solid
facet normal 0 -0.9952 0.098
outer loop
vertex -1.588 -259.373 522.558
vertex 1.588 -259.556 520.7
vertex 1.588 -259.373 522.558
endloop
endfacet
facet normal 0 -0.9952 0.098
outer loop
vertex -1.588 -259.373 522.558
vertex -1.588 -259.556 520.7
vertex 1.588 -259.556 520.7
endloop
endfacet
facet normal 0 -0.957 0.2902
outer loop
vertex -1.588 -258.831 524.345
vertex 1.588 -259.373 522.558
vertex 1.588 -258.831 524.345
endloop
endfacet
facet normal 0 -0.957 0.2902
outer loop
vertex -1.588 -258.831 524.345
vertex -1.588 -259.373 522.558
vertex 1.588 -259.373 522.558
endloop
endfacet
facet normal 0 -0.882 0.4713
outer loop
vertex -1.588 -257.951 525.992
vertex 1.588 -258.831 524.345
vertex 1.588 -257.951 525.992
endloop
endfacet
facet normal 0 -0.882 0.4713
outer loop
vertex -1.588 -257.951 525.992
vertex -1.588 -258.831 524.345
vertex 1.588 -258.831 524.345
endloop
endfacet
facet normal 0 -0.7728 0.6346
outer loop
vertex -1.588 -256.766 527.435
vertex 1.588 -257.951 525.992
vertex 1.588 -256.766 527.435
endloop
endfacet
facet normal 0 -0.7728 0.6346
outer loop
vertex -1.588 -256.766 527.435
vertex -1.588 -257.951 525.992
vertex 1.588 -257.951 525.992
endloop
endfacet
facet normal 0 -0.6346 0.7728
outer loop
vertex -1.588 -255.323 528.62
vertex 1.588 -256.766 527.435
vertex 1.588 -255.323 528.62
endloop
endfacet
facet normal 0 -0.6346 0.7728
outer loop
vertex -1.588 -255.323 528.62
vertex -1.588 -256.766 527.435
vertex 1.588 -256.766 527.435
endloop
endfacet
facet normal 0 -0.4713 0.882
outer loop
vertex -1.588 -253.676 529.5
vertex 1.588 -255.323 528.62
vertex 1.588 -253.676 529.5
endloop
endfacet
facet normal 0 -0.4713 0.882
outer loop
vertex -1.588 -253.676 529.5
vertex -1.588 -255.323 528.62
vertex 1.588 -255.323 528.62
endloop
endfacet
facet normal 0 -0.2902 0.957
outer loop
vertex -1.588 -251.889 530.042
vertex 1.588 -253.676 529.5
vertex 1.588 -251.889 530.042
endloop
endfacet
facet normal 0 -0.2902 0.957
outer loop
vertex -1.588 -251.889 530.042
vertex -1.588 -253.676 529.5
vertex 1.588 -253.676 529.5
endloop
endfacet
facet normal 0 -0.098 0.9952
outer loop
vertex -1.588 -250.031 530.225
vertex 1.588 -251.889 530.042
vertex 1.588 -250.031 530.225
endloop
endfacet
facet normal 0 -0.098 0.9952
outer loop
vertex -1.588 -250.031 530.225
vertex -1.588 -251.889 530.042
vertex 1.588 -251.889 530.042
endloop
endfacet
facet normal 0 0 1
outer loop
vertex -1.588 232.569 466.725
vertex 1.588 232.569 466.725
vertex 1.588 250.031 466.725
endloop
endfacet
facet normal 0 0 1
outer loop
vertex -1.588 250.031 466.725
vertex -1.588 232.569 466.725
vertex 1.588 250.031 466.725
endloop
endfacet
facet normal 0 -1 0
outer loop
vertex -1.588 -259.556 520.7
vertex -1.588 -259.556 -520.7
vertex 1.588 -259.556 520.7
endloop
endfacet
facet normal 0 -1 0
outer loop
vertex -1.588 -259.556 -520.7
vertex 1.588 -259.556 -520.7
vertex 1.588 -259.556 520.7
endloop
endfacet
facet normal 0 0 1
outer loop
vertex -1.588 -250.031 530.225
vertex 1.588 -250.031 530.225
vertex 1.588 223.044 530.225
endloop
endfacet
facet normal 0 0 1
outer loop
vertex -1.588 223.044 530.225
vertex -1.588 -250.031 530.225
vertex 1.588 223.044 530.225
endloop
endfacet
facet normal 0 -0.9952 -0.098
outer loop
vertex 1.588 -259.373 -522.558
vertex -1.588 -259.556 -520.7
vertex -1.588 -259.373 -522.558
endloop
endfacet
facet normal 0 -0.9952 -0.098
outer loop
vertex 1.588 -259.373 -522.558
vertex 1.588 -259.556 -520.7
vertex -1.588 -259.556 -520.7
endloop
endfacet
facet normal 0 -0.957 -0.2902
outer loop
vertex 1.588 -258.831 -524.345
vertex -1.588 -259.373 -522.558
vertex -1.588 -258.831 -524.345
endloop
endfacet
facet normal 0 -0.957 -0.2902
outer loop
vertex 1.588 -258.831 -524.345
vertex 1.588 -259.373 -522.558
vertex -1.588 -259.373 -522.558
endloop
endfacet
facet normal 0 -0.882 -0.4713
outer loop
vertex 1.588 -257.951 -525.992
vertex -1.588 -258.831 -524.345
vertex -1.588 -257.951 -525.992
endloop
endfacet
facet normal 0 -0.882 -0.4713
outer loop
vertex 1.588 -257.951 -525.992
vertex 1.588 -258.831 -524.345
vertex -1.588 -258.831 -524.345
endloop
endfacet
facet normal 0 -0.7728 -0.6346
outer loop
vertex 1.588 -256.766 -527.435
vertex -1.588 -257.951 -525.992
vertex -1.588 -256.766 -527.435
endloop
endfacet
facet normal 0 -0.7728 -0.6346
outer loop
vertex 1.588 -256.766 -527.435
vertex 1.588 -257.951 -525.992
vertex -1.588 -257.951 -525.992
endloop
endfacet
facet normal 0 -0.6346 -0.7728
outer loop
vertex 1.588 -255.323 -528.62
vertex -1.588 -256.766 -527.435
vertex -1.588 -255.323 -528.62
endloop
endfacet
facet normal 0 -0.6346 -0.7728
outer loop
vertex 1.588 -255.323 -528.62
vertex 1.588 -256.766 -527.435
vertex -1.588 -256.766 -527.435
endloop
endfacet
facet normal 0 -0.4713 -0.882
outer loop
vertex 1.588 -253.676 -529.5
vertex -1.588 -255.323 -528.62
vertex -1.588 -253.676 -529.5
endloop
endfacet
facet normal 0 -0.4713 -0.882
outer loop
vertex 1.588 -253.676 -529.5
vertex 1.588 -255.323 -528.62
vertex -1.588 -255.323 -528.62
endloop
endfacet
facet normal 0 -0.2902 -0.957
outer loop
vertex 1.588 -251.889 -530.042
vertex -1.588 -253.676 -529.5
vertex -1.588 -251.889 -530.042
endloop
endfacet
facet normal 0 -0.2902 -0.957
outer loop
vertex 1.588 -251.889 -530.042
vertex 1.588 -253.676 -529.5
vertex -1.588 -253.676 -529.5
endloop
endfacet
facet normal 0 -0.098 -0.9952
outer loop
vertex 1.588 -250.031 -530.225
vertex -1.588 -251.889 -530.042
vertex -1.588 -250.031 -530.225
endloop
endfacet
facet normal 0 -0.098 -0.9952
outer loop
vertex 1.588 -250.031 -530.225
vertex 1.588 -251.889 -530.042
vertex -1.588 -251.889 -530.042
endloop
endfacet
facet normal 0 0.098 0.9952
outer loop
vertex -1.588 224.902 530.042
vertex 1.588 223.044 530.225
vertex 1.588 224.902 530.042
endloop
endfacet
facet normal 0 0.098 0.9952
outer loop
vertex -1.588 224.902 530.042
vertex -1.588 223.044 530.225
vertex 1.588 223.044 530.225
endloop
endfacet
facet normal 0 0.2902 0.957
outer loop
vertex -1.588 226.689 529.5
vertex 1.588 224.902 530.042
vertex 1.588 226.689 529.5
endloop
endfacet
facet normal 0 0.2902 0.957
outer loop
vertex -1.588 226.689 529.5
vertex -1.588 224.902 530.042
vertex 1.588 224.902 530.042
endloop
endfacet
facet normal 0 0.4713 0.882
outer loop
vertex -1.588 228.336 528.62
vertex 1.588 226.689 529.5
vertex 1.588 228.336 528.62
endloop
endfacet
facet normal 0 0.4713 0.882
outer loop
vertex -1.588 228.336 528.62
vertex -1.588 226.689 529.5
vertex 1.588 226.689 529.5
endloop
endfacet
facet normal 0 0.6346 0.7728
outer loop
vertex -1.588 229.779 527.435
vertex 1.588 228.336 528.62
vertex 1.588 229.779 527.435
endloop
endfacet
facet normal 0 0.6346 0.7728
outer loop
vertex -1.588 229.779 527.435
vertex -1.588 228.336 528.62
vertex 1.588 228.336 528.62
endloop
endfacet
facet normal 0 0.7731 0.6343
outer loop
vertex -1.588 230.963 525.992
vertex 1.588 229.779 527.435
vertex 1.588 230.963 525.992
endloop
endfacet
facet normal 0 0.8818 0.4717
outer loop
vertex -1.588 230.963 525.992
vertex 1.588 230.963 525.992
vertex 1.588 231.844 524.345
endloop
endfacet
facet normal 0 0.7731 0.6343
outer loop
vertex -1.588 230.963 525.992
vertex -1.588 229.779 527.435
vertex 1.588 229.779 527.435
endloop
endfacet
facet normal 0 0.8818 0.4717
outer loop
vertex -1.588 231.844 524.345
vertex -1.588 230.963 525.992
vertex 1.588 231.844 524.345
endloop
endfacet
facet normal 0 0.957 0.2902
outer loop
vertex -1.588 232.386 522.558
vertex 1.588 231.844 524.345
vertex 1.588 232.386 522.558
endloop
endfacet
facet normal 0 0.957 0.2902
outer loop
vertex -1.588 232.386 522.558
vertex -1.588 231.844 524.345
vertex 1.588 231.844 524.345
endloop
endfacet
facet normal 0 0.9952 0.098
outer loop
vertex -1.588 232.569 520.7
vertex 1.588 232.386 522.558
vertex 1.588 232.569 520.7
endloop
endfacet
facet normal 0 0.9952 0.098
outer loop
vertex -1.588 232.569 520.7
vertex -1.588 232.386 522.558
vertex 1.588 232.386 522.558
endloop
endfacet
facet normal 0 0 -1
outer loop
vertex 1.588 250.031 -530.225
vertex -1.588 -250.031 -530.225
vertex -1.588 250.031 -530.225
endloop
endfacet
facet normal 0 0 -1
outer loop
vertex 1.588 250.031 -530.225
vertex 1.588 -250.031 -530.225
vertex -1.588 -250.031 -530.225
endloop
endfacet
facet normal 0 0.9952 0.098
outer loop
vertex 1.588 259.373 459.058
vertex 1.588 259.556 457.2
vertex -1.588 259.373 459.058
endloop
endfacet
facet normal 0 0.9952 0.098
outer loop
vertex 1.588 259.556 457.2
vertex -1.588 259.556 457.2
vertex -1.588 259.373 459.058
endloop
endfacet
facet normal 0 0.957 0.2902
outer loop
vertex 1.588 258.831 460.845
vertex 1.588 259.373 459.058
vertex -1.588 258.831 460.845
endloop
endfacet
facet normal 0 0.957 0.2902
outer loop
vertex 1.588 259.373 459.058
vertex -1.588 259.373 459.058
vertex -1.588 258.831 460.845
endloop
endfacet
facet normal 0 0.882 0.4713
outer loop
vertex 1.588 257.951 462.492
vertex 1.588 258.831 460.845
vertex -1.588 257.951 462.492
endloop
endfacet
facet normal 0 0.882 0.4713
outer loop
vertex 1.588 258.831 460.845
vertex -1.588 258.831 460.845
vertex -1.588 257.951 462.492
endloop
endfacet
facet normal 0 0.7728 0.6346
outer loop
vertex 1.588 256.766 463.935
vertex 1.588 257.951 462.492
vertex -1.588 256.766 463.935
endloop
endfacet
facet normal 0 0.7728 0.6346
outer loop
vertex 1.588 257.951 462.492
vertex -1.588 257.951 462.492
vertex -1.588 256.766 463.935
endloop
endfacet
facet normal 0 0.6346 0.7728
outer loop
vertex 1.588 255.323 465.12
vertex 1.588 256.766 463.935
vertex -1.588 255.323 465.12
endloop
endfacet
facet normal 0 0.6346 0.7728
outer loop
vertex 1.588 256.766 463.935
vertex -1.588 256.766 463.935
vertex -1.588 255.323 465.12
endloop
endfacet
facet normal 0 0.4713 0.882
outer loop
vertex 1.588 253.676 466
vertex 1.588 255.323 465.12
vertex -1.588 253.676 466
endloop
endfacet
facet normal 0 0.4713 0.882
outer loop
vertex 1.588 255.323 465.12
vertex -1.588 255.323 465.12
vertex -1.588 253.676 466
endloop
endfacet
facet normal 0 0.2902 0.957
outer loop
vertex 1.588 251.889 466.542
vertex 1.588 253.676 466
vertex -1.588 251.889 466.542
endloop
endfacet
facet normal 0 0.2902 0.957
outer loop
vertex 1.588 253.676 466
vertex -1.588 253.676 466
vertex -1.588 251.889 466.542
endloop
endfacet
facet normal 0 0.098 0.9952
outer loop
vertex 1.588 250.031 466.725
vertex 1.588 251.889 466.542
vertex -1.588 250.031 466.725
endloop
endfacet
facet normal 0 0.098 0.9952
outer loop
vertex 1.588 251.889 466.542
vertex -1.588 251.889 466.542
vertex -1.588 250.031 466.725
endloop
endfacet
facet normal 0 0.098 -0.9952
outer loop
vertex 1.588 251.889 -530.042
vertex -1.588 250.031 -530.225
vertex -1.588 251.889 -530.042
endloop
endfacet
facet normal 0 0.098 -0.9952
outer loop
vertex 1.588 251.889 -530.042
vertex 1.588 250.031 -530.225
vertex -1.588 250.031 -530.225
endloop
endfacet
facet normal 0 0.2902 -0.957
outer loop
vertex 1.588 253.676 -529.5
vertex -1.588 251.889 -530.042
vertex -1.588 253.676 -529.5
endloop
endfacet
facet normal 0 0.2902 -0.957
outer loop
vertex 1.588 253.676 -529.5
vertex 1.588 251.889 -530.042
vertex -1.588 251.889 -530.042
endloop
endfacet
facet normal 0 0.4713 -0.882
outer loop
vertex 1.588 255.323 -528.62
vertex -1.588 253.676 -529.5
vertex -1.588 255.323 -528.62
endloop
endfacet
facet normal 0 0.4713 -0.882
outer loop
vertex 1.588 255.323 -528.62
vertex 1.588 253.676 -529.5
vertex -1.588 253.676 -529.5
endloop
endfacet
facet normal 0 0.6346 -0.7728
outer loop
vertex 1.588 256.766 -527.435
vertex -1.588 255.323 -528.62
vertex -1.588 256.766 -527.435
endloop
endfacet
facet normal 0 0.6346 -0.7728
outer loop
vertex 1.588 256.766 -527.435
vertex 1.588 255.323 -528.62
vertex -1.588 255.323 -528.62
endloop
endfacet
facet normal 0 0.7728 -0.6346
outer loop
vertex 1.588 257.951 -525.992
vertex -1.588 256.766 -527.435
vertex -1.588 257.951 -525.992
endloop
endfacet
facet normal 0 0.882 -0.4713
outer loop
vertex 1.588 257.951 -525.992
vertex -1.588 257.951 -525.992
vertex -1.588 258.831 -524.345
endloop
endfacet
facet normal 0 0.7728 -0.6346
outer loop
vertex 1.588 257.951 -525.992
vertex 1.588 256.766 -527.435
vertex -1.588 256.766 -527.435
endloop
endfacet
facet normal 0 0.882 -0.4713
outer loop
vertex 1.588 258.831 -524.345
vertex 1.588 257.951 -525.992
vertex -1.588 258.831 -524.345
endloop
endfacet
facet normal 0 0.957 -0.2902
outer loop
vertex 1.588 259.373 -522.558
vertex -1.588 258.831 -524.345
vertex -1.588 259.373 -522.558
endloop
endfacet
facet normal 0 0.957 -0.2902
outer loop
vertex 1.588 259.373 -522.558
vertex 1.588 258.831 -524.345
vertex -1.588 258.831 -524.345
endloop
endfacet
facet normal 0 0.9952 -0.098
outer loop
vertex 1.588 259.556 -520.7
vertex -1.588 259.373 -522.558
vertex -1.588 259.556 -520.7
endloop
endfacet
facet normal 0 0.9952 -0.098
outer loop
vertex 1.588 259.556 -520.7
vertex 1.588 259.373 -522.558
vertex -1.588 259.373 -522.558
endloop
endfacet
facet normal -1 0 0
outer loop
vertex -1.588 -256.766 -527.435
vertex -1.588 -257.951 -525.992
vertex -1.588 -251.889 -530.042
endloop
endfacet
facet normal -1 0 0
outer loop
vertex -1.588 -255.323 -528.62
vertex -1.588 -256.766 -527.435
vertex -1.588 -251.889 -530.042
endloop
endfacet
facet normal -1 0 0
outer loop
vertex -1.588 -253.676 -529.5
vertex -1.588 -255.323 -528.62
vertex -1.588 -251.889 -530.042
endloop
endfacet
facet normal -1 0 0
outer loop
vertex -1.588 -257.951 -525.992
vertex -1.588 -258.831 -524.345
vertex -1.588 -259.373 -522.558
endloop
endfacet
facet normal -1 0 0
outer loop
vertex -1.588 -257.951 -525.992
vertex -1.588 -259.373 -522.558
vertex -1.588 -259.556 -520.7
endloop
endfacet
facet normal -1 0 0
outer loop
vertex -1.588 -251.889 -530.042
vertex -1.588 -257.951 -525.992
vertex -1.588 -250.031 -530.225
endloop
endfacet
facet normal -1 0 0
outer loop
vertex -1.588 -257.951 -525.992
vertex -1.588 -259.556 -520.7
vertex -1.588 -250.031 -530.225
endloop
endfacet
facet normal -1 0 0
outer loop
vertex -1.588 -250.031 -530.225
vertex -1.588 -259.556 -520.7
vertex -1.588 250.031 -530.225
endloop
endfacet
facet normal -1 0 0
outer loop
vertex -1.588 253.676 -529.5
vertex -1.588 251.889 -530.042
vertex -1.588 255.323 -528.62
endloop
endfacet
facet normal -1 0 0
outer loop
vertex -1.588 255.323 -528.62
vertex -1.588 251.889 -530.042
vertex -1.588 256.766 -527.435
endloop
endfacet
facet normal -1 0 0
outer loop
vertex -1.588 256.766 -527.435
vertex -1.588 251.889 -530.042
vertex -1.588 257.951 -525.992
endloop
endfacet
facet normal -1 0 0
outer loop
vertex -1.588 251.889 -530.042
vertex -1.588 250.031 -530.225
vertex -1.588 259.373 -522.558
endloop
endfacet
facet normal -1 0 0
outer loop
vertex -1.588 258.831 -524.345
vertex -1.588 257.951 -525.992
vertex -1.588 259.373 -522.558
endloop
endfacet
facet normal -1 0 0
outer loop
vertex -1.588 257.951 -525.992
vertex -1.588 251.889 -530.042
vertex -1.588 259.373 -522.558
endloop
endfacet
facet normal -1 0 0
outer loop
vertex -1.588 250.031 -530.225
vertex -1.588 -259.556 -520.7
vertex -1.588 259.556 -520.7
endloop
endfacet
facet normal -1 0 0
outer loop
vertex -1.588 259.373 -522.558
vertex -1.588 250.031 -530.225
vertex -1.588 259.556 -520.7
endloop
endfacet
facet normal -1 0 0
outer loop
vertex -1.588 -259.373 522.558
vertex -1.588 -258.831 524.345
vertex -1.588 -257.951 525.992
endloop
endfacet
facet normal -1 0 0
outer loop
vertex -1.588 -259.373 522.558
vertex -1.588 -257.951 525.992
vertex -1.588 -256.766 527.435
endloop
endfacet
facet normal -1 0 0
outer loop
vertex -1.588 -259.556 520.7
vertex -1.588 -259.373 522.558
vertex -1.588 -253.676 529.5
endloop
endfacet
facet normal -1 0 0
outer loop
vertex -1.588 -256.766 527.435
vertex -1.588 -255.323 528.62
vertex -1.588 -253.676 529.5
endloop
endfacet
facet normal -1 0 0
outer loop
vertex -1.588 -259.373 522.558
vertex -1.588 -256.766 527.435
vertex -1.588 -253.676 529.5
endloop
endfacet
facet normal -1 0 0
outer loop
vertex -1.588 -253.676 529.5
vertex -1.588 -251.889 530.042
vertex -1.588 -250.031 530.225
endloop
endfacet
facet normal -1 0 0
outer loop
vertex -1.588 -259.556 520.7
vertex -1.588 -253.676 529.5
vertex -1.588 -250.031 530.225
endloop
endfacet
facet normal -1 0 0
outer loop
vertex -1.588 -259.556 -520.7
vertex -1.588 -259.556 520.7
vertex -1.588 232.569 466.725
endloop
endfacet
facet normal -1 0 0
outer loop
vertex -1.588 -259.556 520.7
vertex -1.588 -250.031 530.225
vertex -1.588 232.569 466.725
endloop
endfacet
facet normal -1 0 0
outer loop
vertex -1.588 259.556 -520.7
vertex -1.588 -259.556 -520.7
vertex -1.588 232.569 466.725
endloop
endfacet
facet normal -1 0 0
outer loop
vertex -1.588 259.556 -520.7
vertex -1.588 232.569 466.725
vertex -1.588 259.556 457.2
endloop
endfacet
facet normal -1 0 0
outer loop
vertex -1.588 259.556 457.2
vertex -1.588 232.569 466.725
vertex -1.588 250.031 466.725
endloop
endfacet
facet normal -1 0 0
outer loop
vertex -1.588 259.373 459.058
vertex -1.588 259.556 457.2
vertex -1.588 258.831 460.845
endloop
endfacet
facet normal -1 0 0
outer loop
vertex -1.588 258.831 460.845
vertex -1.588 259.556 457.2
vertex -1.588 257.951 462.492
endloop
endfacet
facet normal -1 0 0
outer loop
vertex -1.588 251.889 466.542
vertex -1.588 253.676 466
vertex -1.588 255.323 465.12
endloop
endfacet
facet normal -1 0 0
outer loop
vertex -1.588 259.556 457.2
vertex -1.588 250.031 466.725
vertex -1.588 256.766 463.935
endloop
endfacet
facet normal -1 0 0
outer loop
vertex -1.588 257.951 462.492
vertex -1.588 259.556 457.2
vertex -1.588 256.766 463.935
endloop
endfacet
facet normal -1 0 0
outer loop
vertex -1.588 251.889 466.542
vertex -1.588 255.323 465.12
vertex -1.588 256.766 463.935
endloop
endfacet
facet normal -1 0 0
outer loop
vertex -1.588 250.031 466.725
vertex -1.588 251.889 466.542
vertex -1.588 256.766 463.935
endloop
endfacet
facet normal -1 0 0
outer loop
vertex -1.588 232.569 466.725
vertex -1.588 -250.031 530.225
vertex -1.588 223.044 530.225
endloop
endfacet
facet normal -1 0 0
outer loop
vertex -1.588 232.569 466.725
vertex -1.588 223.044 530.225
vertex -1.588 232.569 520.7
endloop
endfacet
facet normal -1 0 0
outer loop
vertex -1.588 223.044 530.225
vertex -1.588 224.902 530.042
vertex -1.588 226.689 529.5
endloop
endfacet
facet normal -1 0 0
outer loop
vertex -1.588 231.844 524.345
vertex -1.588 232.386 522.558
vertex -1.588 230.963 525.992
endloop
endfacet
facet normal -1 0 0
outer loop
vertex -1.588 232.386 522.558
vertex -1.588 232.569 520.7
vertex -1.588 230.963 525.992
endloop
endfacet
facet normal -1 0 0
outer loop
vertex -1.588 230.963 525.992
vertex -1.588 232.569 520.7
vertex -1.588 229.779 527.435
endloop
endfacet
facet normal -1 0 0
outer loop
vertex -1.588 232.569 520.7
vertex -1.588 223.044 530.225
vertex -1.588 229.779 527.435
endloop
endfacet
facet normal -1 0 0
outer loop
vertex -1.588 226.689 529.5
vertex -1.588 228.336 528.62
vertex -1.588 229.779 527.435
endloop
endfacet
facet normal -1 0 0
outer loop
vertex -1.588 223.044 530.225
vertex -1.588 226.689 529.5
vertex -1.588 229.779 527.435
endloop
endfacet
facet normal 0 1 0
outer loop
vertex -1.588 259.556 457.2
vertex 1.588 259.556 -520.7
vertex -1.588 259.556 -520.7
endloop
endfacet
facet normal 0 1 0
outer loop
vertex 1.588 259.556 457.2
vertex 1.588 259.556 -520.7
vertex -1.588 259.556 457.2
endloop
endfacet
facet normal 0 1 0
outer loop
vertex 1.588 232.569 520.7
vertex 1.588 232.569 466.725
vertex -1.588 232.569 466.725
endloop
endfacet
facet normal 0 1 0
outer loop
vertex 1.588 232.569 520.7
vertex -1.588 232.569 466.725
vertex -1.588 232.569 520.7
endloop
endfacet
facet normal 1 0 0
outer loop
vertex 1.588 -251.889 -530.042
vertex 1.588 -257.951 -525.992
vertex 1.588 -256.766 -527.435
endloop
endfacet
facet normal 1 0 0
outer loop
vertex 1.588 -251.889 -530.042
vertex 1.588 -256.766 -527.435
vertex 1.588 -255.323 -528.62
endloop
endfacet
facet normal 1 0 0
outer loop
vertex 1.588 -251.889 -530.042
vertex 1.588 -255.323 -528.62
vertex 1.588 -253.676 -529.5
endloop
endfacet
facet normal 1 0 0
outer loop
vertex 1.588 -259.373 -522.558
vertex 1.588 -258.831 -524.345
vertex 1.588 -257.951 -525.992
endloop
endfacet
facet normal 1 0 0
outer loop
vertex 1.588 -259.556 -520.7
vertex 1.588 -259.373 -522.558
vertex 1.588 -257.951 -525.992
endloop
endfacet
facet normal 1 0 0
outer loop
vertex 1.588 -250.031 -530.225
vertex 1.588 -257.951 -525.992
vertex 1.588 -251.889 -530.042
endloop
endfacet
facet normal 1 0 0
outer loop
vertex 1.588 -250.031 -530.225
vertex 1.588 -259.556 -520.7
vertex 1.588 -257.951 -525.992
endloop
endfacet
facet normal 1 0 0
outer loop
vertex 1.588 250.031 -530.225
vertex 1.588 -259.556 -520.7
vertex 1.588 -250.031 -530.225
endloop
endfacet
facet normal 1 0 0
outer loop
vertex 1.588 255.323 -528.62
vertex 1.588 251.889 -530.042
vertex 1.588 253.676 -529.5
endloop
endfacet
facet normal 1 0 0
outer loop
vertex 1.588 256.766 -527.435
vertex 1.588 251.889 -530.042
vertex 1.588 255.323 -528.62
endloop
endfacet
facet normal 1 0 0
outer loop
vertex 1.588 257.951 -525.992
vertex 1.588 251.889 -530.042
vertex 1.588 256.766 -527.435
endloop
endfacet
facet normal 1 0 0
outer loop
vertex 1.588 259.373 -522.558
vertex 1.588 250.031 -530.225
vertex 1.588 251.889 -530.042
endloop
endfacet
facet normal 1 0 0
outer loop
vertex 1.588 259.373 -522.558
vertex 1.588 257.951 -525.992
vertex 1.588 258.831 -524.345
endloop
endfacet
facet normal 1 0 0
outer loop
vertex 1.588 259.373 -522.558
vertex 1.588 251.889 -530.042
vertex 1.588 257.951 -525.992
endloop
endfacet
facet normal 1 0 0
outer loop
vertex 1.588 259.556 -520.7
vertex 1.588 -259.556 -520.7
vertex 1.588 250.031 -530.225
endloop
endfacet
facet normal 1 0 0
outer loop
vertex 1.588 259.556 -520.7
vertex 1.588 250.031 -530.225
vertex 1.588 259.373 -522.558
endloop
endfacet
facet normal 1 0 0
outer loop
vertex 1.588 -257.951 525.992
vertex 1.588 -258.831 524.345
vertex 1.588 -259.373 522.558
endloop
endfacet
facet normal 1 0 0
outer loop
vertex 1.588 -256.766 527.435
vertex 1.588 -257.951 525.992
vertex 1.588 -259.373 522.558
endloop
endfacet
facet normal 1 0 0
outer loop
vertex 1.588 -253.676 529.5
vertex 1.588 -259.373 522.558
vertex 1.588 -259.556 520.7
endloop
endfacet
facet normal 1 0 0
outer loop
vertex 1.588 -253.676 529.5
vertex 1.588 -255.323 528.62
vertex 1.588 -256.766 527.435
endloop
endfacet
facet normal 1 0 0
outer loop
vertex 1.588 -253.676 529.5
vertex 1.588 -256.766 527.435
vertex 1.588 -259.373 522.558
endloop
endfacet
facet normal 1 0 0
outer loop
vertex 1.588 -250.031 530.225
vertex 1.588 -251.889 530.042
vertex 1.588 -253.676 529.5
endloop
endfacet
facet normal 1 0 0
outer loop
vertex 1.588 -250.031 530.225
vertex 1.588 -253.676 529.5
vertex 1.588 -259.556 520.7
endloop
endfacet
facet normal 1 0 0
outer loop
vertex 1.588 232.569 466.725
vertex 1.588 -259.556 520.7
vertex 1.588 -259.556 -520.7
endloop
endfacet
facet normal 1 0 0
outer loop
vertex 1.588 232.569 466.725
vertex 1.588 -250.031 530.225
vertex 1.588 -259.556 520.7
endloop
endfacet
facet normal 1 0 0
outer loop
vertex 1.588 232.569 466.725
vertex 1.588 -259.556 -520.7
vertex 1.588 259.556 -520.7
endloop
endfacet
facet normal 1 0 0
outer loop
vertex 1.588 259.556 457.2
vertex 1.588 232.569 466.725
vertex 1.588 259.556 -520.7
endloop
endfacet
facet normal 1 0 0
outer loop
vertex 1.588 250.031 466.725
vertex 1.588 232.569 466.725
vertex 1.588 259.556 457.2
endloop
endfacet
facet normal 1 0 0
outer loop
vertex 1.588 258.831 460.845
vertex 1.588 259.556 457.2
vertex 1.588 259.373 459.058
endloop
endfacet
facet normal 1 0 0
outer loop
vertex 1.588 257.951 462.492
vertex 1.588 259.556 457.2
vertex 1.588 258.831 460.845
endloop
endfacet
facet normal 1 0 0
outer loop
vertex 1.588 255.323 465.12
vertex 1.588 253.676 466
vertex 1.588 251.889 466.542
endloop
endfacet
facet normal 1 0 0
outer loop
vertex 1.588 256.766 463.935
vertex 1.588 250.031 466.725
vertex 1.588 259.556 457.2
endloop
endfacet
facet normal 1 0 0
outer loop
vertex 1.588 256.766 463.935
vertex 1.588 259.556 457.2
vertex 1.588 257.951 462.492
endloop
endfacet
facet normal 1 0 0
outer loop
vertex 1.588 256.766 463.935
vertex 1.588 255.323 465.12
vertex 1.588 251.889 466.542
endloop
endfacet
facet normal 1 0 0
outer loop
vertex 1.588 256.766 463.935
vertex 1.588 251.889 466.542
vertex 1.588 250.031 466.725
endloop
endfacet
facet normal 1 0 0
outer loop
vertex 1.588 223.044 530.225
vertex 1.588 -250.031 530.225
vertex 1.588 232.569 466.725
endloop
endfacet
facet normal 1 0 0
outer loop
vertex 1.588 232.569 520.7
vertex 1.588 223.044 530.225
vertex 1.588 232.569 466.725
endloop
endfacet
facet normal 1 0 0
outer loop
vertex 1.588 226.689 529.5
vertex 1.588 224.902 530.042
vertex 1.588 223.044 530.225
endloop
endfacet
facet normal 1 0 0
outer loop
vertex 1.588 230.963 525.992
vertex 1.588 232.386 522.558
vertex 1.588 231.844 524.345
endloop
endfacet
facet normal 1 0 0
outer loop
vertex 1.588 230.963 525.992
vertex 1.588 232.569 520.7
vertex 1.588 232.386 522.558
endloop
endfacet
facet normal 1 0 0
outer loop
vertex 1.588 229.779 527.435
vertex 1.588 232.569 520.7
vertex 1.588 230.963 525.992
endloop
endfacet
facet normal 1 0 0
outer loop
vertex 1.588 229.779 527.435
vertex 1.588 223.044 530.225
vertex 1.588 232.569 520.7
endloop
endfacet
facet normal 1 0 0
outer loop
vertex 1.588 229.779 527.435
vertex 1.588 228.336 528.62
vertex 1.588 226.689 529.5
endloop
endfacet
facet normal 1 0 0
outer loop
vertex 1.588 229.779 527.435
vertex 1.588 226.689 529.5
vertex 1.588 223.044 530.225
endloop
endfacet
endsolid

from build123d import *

# Parameters (mm, degrees)
F0_W     = 519.1125
F0_H     = 1060.45
F1_DEPTH = 1.5875
F2_W     = 26.9875
F2_H     = 63.5
F3_DEPTH = 3.176
F4_R     = 9.525


with BuildPart() as f1:
    # F0 (on Right) → F1 (new body, symmetric)
    with BuildSketch(Plane.YZ):
        Rectangle(F0_W, F0_H)
    extrude(amount=F1_DEPTH, both=True)

    # F2 (on face) → F3 (cut, through all)
    with BuildSketch(Plane.YZ.offset(1.5875)):
        with Locations((246.0625, 498.475)):
            Rectangle(F2_W, F2_H)
    extrude(amount=-F3_DEPTH, mode=Mode.SUBTRACT)

    # F4
    f4_edges = [f1.edges().sort_by_distance(p)[0] for p in [
        (0, -259.55625, 530.225),
        (0, -259.55625, -530.225),
        (0, 259.55625, -530.225),
        (0, 232.56875, 530.225),
        (0, 259.55625, 466.725),
    ]]
    fillet(f4_edges, radius=F4_R)


solid = f1.part
